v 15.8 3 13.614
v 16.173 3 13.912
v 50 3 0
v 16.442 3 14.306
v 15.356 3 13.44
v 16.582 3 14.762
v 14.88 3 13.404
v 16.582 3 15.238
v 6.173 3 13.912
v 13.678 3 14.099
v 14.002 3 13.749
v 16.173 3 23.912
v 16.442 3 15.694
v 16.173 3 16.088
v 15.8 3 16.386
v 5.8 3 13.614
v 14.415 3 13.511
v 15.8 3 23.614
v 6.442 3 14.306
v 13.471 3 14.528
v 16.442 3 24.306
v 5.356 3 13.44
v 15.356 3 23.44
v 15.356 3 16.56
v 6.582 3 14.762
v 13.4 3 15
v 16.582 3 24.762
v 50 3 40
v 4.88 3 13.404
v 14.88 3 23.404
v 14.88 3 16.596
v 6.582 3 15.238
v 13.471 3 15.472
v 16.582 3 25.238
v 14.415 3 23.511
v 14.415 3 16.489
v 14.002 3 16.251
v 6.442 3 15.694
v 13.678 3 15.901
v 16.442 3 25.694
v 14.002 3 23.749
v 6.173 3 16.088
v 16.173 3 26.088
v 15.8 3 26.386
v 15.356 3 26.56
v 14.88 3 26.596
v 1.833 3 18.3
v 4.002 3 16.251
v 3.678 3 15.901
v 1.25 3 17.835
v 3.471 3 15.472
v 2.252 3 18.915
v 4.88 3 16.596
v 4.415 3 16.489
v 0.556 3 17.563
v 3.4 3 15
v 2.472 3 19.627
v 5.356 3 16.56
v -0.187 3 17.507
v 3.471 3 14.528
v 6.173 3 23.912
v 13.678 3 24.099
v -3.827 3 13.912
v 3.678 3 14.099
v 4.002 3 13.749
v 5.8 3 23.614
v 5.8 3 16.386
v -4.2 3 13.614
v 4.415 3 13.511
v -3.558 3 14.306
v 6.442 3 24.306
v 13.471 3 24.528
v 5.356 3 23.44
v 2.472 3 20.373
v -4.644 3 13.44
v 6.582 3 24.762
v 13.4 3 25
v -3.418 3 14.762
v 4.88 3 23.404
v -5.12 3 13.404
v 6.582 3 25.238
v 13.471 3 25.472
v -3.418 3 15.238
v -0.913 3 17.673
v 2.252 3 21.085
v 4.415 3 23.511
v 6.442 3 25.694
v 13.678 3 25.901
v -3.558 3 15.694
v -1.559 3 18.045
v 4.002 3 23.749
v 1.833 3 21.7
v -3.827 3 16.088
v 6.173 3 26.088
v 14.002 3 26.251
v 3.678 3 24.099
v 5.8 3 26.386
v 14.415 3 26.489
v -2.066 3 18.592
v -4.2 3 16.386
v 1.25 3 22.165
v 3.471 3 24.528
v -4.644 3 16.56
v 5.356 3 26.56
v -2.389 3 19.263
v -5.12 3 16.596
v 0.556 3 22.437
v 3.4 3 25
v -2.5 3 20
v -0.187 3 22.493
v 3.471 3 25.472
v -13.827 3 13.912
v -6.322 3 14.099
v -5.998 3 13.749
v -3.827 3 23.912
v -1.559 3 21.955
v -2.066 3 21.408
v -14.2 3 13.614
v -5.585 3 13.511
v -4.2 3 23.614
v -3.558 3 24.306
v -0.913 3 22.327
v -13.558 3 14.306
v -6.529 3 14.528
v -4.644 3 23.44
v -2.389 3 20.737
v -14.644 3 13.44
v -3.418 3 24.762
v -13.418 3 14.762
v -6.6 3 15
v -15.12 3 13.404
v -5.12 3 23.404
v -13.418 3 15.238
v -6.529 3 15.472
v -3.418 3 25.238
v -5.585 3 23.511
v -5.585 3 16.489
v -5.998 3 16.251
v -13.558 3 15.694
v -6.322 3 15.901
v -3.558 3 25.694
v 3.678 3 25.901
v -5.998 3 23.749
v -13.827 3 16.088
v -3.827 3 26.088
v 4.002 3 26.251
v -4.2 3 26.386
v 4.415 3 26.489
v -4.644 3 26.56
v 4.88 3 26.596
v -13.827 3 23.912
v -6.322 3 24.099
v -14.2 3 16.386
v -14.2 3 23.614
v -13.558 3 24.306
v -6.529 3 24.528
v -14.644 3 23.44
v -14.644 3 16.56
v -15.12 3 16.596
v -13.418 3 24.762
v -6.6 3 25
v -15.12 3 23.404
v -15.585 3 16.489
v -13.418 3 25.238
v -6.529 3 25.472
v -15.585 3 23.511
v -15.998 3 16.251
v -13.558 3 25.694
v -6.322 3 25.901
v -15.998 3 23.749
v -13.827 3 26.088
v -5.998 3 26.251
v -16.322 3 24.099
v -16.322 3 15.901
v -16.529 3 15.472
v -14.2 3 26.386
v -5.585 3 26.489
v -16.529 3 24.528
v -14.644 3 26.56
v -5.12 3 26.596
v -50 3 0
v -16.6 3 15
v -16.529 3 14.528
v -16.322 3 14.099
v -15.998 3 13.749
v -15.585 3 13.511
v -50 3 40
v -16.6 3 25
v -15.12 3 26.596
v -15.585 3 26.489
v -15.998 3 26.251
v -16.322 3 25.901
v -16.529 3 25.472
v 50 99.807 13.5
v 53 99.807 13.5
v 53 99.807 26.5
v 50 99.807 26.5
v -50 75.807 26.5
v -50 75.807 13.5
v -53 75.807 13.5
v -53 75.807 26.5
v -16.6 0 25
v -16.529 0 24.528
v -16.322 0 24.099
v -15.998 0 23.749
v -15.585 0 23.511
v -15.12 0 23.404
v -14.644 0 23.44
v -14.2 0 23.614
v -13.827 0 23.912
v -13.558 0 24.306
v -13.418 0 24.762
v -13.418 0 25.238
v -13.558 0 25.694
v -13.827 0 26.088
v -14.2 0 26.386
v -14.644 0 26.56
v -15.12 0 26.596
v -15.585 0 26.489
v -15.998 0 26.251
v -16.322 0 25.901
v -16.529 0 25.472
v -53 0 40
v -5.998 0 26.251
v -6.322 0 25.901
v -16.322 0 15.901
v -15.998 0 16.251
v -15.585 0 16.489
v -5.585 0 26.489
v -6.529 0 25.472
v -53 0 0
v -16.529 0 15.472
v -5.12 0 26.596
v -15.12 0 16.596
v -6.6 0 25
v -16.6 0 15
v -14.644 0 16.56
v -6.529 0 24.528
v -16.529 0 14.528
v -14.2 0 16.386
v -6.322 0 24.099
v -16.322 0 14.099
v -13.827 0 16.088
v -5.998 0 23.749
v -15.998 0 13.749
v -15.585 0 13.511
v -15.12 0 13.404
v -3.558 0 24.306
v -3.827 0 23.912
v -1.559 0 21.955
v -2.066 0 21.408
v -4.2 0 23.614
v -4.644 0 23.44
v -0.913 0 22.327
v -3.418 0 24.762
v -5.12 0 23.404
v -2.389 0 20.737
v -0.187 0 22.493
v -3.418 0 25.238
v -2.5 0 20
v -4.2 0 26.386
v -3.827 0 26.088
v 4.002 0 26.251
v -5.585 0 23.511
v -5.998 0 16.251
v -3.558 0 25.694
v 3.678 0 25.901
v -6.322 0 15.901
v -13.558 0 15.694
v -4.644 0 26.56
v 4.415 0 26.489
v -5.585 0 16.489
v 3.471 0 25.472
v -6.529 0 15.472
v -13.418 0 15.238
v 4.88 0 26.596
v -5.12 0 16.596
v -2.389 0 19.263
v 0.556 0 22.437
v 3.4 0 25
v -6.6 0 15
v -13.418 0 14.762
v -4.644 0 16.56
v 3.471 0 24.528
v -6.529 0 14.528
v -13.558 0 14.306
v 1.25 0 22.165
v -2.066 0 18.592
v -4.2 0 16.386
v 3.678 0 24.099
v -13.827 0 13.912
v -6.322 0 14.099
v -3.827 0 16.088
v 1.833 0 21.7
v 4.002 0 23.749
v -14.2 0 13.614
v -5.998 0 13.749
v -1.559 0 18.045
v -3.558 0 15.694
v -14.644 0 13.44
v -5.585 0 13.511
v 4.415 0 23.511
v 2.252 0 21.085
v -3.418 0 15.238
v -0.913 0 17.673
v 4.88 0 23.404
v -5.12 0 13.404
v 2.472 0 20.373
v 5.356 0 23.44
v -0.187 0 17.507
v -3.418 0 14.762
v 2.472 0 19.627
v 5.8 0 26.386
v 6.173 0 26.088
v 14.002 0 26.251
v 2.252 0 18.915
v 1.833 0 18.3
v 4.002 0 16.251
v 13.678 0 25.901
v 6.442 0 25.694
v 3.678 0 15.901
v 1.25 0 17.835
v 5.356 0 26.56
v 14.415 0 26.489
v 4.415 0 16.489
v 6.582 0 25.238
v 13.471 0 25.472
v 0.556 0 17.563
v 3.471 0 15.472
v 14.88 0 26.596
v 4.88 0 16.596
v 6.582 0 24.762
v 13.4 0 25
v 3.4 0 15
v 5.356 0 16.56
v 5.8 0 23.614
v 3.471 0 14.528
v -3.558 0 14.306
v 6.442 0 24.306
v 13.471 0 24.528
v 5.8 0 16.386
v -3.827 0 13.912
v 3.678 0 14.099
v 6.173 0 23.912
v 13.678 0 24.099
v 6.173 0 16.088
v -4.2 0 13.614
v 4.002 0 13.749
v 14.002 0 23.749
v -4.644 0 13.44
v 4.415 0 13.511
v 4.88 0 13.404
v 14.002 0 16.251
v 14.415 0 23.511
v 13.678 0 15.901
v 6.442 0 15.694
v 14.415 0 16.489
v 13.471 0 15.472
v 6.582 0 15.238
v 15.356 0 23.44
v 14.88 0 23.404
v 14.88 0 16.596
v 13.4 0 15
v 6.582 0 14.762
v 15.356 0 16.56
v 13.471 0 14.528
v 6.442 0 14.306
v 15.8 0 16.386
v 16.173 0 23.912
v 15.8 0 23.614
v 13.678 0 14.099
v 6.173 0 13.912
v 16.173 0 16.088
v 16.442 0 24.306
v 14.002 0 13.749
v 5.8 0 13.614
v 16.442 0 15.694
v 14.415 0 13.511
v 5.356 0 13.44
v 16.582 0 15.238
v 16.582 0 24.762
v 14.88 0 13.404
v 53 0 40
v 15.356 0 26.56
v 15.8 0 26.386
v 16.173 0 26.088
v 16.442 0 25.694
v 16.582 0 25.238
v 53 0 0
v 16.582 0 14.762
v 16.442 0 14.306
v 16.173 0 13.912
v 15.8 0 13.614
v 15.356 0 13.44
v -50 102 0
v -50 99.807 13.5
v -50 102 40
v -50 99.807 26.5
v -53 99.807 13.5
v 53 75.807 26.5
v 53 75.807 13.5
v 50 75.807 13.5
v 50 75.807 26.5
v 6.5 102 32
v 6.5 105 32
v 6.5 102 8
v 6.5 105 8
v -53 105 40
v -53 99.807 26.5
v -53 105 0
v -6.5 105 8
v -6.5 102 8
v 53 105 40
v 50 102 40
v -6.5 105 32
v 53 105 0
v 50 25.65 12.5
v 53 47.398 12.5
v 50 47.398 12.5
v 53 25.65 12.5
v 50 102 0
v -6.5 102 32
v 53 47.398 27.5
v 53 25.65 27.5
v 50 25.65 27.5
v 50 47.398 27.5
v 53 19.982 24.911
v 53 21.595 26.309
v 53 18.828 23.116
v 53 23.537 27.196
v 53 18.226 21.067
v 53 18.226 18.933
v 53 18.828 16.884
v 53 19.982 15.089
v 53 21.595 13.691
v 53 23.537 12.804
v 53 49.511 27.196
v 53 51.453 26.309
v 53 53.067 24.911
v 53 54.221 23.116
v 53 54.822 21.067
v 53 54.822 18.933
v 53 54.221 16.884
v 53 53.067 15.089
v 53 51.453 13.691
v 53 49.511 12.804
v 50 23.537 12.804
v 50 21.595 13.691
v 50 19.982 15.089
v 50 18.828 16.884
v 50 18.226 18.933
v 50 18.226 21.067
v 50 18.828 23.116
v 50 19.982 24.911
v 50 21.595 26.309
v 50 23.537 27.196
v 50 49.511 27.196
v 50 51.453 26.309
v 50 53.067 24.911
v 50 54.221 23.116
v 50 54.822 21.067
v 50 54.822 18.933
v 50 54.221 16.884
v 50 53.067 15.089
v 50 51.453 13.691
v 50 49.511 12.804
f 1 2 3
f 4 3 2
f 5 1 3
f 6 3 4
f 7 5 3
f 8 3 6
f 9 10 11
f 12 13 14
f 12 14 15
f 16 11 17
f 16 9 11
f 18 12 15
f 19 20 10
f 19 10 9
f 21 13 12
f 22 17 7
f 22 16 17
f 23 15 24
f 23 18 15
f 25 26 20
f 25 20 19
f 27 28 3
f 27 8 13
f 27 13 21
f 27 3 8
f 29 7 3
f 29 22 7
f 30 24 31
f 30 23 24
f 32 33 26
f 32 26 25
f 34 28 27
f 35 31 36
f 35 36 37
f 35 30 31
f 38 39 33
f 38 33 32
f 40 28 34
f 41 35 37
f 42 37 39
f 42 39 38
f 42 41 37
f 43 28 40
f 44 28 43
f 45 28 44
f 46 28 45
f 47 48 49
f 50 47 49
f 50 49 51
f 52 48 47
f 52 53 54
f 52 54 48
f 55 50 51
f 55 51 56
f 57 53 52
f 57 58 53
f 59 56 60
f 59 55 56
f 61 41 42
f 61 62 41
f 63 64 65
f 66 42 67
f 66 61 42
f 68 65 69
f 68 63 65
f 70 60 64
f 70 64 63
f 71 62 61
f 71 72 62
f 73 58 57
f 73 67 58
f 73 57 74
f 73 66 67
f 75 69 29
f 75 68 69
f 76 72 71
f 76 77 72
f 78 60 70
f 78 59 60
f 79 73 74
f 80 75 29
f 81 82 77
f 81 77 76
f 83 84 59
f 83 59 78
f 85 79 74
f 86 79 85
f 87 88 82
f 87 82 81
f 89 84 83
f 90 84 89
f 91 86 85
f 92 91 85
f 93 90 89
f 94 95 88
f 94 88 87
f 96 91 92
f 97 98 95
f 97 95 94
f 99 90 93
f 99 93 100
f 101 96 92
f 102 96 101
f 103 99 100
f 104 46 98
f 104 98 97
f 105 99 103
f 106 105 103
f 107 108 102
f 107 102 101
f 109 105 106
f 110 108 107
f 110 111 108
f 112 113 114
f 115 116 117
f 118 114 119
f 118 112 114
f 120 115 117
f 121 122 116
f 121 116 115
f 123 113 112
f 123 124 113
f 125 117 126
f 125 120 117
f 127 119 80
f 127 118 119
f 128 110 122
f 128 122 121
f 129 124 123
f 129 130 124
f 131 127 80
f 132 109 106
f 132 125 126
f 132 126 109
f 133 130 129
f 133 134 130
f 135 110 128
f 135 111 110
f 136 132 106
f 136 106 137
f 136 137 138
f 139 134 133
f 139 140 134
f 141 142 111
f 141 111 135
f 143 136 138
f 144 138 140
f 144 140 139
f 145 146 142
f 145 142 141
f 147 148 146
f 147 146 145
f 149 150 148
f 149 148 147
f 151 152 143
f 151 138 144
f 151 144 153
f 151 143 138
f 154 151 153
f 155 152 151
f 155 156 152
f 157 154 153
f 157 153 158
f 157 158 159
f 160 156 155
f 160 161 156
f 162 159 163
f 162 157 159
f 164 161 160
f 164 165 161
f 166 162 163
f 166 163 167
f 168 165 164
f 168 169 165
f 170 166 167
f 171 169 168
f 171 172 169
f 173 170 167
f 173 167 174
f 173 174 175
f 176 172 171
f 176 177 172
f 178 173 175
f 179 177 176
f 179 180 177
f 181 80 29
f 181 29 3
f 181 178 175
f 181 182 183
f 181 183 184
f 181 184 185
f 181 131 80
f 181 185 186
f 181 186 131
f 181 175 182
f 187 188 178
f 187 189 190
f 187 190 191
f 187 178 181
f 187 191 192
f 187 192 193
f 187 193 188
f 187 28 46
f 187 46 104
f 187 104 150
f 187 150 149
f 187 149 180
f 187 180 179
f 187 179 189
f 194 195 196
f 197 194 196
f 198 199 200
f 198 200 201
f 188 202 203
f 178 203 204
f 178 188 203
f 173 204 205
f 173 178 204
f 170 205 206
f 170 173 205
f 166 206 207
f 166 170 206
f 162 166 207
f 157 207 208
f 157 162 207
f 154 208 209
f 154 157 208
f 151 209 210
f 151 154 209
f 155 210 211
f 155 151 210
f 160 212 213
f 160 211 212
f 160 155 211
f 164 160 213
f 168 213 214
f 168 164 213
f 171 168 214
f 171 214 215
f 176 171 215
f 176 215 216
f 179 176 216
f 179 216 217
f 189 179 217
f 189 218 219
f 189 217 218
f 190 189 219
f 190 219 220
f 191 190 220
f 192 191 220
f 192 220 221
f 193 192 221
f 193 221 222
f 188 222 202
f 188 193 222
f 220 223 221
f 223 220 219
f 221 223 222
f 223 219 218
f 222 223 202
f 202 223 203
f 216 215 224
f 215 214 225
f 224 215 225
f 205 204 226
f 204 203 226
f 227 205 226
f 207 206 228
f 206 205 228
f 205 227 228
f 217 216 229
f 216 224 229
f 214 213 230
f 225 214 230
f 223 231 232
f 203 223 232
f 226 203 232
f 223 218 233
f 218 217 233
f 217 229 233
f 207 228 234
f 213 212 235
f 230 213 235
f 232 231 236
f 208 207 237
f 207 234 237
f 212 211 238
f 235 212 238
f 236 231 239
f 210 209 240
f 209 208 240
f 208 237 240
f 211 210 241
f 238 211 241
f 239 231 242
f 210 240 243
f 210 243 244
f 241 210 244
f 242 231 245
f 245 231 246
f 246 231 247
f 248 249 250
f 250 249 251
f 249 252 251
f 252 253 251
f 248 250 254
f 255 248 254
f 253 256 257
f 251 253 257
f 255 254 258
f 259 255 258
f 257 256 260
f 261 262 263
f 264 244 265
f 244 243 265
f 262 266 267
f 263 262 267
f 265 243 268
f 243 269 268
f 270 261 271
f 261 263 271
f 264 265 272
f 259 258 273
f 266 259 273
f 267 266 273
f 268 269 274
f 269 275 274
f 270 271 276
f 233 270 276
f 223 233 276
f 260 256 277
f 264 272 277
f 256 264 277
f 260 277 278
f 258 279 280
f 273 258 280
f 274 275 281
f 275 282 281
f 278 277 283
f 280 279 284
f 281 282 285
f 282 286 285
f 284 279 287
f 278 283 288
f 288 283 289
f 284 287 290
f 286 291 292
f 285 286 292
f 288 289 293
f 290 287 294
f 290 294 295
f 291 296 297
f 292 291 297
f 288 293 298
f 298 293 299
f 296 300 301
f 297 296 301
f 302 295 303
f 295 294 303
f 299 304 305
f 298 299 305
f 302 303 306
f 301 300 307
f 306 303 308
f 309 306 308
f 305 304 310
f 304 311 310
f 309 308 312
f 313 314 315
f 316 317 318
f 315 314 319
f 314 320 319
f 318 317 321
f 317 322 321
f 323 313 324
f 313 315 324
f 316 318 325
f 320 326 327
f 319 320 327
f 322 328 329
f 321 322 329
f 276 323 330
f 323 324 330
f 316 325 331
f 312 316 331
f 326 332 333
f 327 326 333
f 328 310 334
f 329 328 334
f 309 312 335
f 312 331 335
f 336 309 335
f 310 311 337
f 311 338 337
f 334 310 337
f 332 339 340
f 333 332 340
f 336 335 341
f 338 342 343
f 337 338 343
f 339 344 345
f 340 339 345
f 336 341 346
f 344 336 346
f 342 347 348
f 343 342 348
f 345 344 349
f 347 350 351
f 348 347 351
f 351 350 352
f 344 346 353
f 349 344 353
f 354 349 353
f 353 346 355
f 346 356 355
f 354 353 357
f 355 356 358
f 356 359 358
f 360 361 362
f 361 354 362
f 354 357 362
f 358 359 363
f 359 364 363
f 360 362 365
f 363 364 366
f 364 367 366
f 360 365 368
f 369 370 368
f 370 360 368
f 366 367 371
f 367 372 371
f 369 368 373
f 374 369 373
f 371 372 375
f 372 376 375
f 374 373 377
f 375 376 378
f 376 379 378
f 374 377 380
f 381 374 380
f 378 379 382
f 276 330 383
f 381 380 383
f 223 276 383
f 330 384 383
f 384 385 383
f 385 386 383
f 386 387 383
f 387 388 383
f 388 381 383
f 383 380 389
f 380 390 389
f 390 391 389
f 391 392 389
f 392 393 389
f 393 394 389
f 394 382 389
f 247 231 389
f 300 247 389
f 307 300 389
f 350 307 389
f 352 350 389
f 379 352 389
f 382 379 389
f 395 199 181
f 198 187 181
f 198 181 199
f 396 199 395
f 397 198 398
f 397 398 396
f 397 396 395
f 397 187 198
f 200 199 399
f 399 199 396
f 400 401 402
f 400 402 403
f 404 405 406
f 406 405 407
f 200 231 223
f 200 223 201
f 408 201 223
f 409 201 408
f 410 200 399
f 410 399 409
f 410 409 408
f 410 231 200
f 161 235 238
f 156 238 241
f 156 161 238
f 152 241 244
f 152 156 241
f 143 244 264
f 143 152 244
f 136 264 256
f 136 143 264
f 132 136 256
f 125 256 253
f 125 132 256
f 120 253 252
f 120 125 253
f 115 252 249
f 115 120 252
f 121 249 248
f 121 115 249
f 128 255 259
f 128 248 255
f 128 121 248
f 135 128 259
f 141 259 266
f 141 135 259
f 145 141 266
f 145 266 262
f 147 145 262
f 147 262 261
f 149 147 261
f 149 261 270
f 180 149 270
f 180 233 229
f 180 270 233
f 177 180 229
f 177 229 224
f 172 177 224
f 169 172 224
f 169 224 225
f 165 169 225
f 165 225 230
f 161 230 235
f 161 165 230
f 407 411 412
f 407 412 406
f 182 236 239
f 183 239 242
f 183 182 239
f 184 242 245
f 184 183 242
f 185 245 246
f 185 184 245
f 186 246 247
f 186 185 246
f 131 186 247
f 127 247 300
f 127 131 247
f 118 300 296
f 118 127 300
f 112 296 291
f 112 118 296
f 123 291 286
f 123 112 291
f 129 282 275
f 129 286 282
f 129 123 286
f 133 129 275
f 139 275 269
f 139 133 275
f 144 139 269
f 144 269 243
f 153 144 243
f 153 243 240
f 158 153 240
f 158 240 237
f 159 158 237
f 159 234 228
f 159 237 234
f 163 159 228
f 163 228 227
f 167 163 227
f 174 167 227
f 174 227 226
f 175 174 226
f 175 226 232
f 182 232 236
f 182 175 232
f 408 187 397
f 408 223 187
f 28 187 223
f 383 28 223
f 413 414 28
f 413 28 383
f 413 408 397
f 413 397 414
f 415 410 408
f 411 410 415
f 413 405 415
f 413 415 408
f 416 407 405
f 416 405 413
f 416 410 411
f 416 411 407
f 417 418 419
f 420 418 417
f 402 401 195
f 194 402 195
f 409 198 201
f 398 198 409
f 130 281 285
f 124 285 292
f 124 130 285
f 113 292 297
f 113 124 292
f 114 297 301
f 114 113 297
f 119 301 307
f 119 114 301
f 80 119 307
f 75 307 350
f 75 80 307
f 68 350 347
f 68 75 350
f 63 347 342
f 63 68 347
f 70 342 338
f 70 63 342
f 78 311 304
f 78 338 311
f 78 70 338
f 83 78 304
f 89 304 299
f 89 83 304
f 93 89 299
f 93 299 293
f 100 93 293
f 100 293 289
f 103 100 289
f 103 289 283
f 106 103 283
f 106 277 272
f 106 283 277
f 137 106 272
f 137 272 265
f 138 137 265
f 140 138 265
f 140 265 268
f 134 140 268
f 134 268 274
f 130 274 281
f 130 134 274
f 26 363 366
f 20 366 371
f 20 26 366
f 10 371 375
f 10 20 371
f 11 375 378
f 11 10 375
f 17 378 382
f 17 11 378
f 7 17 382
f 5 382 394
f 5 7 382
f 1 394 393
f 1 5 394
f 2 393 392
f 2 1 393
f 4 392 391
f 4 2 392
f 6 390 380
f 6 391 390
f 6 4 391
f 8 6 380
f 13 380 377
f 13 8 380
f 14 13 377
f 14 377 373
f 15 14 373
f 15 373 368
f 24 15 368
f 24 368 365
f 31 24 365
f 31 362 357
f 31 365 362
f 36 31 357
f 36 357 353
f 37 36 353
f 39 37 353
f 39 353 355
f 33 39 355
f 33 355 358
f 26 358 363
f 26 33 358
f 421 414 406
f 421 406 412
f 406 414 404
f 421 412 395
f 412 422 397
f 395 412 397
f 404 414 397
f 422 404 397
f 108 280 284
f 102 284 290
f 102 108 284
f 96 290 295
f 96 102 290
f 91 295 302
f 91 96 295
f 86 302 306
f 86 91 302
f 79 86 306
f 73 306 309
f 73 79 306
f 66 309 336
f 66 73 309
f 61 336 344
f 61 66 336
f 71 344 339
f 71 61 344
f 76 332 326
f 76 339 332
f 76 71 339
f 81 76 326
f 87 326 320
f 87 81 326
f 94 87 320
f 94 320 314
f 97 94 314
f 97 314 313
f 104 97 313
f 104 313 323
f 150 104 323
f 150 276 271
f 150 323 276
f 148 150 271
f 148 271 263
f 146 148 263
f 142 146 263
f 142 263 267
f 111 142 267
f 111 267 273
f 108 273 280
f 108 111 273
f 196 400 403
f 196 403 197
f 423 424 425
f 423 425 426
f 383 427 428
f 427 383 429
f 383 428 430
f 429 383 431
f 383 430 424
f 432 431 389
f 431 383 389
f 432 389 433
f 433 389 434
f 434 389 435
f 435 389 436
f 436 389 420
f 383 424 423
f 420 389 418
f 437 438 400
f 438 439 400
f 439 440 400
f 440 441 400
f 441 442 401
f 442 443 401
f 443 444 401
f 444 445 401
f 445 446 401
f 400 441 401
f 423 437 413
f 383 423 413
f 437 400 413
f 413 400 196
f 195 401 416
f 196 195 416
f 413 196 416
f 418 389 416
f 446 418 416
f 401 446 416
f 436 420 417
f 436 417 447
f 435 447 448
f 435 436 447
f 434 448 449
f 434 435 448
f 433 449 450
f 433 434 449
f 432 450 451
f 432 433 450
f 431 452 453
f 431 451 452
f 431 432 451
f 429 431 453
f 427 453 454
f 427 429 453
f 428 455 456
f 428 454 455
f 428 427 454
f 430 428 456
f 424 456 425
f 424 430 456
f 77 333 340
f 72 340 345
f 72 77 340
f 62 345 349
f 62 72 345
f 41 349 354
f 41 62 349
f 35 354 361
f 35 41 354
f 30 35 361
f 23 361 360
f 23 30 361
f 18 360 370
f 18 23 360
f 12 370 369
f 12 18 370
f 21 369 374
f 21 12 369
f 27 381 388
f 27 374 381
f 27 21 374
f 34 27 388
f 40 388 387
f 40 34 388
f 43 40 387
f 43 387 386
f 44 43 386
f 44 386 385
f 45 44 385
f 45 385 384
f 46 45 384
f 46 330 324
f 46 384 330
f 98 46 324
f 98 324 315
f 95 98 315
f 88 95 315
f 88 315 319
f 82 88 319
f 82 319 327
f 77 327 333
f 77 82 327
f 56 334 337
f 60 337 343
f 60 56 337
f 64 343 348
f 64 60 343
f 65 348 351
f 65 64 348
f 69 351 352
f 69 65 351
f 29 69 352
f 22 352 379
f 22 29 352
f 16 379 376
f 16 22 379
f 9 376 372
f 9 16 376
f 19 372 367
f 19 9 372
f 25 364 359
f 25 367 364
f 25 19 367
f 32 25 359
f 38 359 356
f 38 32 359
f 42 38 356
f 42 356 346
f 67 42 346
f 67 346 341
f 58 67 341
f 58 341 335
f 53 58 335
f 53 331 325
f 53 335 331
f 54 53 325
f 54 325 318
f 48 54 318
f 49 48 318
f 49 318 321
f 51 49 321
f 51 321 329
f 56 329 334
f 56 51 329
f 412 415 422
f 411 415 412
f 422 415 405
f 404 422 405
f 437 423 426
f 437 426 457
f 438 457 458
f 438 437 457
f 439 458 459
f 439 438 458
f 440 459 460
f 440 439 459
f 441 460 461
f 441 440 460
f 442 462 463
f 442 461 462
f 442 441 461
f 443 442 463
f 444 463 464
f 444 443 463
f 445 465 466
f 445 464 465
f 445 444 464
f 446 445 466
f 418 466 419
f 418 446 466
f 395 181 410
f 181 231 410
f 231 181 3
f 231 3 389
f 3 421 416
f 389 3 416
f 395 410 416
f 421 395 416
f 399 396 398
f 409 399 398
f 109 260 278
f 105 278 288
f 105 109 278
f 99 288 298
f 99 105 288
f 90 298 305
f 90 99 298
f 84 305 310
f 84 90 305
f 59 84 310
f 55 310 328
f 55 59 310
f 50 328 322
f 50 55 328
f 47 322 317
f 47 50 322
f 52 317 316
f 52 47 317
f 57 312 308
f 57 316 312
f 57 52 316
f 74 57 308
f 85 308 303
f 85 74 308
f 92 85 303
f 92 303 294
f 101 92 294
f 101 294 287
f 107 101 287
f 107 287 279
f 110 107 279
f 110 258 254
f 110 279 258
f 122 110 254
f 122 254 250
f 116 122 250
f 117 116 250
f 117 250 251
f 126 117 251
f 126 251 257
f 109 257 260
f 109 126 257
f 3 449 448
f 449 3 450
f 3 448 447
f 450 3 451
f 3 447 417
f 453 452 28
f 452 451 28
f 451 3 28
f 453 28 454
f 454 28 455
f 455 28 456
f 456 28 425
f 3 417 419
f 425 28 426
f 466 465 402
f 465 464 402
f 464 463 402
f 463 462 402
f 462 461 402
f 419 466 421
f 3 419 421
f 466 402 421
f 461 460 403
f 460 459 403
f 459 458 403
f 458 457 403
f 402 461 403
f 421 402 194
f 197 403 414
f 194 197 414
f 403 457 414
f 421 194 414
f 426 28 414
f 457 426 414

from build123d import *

# Parameters (mm, degrees)
SKETCH_1_W                      = 106
SKETCH_1_H                      = 105
EXTRUDE_1_DEPTH                 = 40
CUT_EXTRUDE_1_DEPTH             = 125.233650836
CUT_EXTRUDE_1_DEPTH_BACK        = 125.233650836
SKETCH_3_W                      = 100
SKETCH_3_H                      = 99
CUT_EXTRUDE_3_DEPTH             = 1
CUT_EXTRUDE_3_DEPTH_BACK        = 3
SKETCH_7_R                      = 2.5
SKETCH_7_R_2                    = 1.6
CUT_EXTRUDE_4_REACH             = 126.234
SKETCH_6_W                      = 13
SKETCH_6_H                      = 24
CUT_EXTRUDE_4_DIRECTION_2_DEPTH = 125.233650836
CUT_EXTRUDE_5_DEPTH             = 155.470061824
CUT_EXTRUDE_5_DEPTH_BACK        = 155.470061824
SKETCH_10_W                     = 13
SKETCH_10_H                     = 24
CUT_EXTRUDE_6_REACH             = 156.47
CUT_EXTRUDE_6_DIRECTION_2_DEPTH = 155.470061824


with BuildPart() as part:
    # 草图1 → 凸台-拉伸1 (new body)
    with BuildSketch(Plane.XY):
        with Locations((0, 52.5)):
            Rectangle(SKETCH_1_W, SKETCH_1_H)
    extrude(amount=EXTRUDE_1_DEPTH)

    # 草图3 → 切除-拉伸1 (cut, two sides: drawn at the far end of the back side and taken through both)
    with BuildSketch(Plane(origin=(0, 0, 0), x_dir=(-1, 0, 0), z_dir=(0, 0, -1)).offset(-CUT_EXTRUDE_1_DEPTH_BACK)):
        with Locations((0, 52.5)):
            Rectangle(SKETCH_3_W, SKETCH_3_H)
    extrude(amount=CUT_EXTRUDE_1_DEPTH + CUT_EXTRUDE_1_DEPTH_BACK, mode=Mode.SUBTRACT)

    # 草图7 → 切除-拉伸3 (cut, two sides: drawn at the far end of the back side and taken through both)
    with BuildSketch(Plane.XZ.offset(-CUT_EXTRUDE_3_DEPTH_BACK)):
        with Locations(Location((0, 20, 0), (0, 0, 180))):
            Circle(SKETCH_7_R)
        with Locations(Location((5, 25, 0), (0, 0, 180))):
            Circle(SKETCH_7_R_2)
        with Locations(Location((5, 15, 0), (0, 0, 180))):
            Circle(SKETCH_7_R_2)
        with Locations(Location((-5, 15, 0), (0, 0, 180))):
            Circle(SKETCH_7_R_2)
        with Locations(Location((-5, 25, 0), (0, 0, 180))):
            Circle(SKETCH_7_R_2)
        with Locations(Location((15, 25, 0), (0, 0, 180))):
            Circle(SKETCH_7_R_2)
        with Locations(Location((-15, 25, 0), (0, 0, 180))):
            Circle(SKETCH_7_R_2)
        with Locations(Location((15, 15, 0), (0, 0, 180))):
            Circle(SKETCH_7_R_2)
        with Locations(Location((-15, 15, 0), (0, 0, 180))):
            Circle(SKETCH_7_R_2)
    extrude(amount=CUT_EXTRUDE_3_DEPTH + CUT_EXTRUDE_3_DEPTH_BACK, mode=Mode.SUBTRACT)

    # 草图6 → 切除-拉伸4 (cut, up to next)
    with BuildSketch(Plane(origin=(0, 105, 0), x_dir=(1, 0, 0), z_dir=(0, 1, 0)), mode=Mode.PRIVATE) as cut_extrude_4_sk1:
        with Locations((0, -20)):
            Rectangle(SKETCH_6_W, SKETCH_6_H)
    cut_extrude_4_tool1 = extrude(cut_extrude_4_sk1.sketch, amount=-CUT_EXTRUDE_4_REACH, mode=Mode.PRIVATE) & part.part
    add(cut_extrude_4_tool1.solids().sort_by_distance((0, 105, 20))[0], mode=Mode.SUBTRACT)

    # 草图6 → 切除-拉伸4 direction 2 (cut)
    with BuildSketch(Plane(origin=(0, 105, 0), x_dir=(1, 0, 0), z_dir=(0, 1, 0))):
        with Locations((0, -20)):
            Rectangle(SKETCH_6_W, SKETCH_6_H)
    extrude(amount=CUT_EXTRUDE_4_DIRECTION_2_DEPTH, mode=Mode.SUBTRACT)

    # 草图10 → 切除-拉伸5 (cut, two sides: drawn at the far end of the back side and taken through both)
    with BuildSketch(Plane.ZY.offset(53).offset(-CUT_EXTRUDE_5_DEPTH_BACK)):
        with Locations((20, 87.806952357)):
            Rectangle(SKETCH_10_W, SKETCH_10_H)
    extrude(amount=CUT_EXTRUDE_5_DEPTH + CUT_EXTRUDE_5_DEPTH_BACK, mode=Mode.SUBTRACT)

    # 草图12 → 切除-拉伸6 (cut, up to next)
    with BuildSketch(Plane(origin=(53, 0, 0), x_dir=(0, 0, -1), z_dir=(1, 0, 0)), mode=Mode.PRIVATE) as cut_extrude_6_sk1:
        with BuildLine():
            Line((-27.5, 25.649961527), (-27.5, 47.398469004))
            ThreePointArc((-27.5, 47.398469004), (-20, 54.898469004), (-12.5, 47.398469004))
            Line((-12.5, 47.398469004), (-12.5, 25.649961527))
            ThreePointArc((-12.5, 25.649961527), (-20, 18.149961527), (-27.5, 25.649961527))
        make_face()
    cut_extrude_6_tool1 = extrude(cut_extrude_6_sk1.sketch, amount=-CUT_EXTRUDE_6_REACH, mode=Mode.PRIVATE) & part.part
    add(cut_extrude_6_tool1.solids().sort_by_distance((53, 36.524215, 20))[0], mode=Mode.SUBTRACT)

    # 草图12 → 切除-拉伸6 direction 2 (cut)
    with BuildSketch(Plane(origin=(53, 0, 0), x_dir=(0, 0, -1), z_dir=(1, 0, 0))):
        with BuildLine():
            Line((-27.5, 25.649961527), (-27.5, 47.398469004))
            ThreePointArc((-27.5, 47.398469004), (-20, 54.898469004), (-12.5, 47.398469004))
            Line((-12.5, 47.398469004), (-12.5, 25.649961527))
            ThreePointArc((-12.5, 25.649961527), (-20, 18.149961527), (-27.5, 25.649961527))
        make_face()
    extrude(amount=CUT_EXTRUDE_6_DIRECTION_2_DEPTH, mode=Mode.SUBTRACT)


solid = part.part
